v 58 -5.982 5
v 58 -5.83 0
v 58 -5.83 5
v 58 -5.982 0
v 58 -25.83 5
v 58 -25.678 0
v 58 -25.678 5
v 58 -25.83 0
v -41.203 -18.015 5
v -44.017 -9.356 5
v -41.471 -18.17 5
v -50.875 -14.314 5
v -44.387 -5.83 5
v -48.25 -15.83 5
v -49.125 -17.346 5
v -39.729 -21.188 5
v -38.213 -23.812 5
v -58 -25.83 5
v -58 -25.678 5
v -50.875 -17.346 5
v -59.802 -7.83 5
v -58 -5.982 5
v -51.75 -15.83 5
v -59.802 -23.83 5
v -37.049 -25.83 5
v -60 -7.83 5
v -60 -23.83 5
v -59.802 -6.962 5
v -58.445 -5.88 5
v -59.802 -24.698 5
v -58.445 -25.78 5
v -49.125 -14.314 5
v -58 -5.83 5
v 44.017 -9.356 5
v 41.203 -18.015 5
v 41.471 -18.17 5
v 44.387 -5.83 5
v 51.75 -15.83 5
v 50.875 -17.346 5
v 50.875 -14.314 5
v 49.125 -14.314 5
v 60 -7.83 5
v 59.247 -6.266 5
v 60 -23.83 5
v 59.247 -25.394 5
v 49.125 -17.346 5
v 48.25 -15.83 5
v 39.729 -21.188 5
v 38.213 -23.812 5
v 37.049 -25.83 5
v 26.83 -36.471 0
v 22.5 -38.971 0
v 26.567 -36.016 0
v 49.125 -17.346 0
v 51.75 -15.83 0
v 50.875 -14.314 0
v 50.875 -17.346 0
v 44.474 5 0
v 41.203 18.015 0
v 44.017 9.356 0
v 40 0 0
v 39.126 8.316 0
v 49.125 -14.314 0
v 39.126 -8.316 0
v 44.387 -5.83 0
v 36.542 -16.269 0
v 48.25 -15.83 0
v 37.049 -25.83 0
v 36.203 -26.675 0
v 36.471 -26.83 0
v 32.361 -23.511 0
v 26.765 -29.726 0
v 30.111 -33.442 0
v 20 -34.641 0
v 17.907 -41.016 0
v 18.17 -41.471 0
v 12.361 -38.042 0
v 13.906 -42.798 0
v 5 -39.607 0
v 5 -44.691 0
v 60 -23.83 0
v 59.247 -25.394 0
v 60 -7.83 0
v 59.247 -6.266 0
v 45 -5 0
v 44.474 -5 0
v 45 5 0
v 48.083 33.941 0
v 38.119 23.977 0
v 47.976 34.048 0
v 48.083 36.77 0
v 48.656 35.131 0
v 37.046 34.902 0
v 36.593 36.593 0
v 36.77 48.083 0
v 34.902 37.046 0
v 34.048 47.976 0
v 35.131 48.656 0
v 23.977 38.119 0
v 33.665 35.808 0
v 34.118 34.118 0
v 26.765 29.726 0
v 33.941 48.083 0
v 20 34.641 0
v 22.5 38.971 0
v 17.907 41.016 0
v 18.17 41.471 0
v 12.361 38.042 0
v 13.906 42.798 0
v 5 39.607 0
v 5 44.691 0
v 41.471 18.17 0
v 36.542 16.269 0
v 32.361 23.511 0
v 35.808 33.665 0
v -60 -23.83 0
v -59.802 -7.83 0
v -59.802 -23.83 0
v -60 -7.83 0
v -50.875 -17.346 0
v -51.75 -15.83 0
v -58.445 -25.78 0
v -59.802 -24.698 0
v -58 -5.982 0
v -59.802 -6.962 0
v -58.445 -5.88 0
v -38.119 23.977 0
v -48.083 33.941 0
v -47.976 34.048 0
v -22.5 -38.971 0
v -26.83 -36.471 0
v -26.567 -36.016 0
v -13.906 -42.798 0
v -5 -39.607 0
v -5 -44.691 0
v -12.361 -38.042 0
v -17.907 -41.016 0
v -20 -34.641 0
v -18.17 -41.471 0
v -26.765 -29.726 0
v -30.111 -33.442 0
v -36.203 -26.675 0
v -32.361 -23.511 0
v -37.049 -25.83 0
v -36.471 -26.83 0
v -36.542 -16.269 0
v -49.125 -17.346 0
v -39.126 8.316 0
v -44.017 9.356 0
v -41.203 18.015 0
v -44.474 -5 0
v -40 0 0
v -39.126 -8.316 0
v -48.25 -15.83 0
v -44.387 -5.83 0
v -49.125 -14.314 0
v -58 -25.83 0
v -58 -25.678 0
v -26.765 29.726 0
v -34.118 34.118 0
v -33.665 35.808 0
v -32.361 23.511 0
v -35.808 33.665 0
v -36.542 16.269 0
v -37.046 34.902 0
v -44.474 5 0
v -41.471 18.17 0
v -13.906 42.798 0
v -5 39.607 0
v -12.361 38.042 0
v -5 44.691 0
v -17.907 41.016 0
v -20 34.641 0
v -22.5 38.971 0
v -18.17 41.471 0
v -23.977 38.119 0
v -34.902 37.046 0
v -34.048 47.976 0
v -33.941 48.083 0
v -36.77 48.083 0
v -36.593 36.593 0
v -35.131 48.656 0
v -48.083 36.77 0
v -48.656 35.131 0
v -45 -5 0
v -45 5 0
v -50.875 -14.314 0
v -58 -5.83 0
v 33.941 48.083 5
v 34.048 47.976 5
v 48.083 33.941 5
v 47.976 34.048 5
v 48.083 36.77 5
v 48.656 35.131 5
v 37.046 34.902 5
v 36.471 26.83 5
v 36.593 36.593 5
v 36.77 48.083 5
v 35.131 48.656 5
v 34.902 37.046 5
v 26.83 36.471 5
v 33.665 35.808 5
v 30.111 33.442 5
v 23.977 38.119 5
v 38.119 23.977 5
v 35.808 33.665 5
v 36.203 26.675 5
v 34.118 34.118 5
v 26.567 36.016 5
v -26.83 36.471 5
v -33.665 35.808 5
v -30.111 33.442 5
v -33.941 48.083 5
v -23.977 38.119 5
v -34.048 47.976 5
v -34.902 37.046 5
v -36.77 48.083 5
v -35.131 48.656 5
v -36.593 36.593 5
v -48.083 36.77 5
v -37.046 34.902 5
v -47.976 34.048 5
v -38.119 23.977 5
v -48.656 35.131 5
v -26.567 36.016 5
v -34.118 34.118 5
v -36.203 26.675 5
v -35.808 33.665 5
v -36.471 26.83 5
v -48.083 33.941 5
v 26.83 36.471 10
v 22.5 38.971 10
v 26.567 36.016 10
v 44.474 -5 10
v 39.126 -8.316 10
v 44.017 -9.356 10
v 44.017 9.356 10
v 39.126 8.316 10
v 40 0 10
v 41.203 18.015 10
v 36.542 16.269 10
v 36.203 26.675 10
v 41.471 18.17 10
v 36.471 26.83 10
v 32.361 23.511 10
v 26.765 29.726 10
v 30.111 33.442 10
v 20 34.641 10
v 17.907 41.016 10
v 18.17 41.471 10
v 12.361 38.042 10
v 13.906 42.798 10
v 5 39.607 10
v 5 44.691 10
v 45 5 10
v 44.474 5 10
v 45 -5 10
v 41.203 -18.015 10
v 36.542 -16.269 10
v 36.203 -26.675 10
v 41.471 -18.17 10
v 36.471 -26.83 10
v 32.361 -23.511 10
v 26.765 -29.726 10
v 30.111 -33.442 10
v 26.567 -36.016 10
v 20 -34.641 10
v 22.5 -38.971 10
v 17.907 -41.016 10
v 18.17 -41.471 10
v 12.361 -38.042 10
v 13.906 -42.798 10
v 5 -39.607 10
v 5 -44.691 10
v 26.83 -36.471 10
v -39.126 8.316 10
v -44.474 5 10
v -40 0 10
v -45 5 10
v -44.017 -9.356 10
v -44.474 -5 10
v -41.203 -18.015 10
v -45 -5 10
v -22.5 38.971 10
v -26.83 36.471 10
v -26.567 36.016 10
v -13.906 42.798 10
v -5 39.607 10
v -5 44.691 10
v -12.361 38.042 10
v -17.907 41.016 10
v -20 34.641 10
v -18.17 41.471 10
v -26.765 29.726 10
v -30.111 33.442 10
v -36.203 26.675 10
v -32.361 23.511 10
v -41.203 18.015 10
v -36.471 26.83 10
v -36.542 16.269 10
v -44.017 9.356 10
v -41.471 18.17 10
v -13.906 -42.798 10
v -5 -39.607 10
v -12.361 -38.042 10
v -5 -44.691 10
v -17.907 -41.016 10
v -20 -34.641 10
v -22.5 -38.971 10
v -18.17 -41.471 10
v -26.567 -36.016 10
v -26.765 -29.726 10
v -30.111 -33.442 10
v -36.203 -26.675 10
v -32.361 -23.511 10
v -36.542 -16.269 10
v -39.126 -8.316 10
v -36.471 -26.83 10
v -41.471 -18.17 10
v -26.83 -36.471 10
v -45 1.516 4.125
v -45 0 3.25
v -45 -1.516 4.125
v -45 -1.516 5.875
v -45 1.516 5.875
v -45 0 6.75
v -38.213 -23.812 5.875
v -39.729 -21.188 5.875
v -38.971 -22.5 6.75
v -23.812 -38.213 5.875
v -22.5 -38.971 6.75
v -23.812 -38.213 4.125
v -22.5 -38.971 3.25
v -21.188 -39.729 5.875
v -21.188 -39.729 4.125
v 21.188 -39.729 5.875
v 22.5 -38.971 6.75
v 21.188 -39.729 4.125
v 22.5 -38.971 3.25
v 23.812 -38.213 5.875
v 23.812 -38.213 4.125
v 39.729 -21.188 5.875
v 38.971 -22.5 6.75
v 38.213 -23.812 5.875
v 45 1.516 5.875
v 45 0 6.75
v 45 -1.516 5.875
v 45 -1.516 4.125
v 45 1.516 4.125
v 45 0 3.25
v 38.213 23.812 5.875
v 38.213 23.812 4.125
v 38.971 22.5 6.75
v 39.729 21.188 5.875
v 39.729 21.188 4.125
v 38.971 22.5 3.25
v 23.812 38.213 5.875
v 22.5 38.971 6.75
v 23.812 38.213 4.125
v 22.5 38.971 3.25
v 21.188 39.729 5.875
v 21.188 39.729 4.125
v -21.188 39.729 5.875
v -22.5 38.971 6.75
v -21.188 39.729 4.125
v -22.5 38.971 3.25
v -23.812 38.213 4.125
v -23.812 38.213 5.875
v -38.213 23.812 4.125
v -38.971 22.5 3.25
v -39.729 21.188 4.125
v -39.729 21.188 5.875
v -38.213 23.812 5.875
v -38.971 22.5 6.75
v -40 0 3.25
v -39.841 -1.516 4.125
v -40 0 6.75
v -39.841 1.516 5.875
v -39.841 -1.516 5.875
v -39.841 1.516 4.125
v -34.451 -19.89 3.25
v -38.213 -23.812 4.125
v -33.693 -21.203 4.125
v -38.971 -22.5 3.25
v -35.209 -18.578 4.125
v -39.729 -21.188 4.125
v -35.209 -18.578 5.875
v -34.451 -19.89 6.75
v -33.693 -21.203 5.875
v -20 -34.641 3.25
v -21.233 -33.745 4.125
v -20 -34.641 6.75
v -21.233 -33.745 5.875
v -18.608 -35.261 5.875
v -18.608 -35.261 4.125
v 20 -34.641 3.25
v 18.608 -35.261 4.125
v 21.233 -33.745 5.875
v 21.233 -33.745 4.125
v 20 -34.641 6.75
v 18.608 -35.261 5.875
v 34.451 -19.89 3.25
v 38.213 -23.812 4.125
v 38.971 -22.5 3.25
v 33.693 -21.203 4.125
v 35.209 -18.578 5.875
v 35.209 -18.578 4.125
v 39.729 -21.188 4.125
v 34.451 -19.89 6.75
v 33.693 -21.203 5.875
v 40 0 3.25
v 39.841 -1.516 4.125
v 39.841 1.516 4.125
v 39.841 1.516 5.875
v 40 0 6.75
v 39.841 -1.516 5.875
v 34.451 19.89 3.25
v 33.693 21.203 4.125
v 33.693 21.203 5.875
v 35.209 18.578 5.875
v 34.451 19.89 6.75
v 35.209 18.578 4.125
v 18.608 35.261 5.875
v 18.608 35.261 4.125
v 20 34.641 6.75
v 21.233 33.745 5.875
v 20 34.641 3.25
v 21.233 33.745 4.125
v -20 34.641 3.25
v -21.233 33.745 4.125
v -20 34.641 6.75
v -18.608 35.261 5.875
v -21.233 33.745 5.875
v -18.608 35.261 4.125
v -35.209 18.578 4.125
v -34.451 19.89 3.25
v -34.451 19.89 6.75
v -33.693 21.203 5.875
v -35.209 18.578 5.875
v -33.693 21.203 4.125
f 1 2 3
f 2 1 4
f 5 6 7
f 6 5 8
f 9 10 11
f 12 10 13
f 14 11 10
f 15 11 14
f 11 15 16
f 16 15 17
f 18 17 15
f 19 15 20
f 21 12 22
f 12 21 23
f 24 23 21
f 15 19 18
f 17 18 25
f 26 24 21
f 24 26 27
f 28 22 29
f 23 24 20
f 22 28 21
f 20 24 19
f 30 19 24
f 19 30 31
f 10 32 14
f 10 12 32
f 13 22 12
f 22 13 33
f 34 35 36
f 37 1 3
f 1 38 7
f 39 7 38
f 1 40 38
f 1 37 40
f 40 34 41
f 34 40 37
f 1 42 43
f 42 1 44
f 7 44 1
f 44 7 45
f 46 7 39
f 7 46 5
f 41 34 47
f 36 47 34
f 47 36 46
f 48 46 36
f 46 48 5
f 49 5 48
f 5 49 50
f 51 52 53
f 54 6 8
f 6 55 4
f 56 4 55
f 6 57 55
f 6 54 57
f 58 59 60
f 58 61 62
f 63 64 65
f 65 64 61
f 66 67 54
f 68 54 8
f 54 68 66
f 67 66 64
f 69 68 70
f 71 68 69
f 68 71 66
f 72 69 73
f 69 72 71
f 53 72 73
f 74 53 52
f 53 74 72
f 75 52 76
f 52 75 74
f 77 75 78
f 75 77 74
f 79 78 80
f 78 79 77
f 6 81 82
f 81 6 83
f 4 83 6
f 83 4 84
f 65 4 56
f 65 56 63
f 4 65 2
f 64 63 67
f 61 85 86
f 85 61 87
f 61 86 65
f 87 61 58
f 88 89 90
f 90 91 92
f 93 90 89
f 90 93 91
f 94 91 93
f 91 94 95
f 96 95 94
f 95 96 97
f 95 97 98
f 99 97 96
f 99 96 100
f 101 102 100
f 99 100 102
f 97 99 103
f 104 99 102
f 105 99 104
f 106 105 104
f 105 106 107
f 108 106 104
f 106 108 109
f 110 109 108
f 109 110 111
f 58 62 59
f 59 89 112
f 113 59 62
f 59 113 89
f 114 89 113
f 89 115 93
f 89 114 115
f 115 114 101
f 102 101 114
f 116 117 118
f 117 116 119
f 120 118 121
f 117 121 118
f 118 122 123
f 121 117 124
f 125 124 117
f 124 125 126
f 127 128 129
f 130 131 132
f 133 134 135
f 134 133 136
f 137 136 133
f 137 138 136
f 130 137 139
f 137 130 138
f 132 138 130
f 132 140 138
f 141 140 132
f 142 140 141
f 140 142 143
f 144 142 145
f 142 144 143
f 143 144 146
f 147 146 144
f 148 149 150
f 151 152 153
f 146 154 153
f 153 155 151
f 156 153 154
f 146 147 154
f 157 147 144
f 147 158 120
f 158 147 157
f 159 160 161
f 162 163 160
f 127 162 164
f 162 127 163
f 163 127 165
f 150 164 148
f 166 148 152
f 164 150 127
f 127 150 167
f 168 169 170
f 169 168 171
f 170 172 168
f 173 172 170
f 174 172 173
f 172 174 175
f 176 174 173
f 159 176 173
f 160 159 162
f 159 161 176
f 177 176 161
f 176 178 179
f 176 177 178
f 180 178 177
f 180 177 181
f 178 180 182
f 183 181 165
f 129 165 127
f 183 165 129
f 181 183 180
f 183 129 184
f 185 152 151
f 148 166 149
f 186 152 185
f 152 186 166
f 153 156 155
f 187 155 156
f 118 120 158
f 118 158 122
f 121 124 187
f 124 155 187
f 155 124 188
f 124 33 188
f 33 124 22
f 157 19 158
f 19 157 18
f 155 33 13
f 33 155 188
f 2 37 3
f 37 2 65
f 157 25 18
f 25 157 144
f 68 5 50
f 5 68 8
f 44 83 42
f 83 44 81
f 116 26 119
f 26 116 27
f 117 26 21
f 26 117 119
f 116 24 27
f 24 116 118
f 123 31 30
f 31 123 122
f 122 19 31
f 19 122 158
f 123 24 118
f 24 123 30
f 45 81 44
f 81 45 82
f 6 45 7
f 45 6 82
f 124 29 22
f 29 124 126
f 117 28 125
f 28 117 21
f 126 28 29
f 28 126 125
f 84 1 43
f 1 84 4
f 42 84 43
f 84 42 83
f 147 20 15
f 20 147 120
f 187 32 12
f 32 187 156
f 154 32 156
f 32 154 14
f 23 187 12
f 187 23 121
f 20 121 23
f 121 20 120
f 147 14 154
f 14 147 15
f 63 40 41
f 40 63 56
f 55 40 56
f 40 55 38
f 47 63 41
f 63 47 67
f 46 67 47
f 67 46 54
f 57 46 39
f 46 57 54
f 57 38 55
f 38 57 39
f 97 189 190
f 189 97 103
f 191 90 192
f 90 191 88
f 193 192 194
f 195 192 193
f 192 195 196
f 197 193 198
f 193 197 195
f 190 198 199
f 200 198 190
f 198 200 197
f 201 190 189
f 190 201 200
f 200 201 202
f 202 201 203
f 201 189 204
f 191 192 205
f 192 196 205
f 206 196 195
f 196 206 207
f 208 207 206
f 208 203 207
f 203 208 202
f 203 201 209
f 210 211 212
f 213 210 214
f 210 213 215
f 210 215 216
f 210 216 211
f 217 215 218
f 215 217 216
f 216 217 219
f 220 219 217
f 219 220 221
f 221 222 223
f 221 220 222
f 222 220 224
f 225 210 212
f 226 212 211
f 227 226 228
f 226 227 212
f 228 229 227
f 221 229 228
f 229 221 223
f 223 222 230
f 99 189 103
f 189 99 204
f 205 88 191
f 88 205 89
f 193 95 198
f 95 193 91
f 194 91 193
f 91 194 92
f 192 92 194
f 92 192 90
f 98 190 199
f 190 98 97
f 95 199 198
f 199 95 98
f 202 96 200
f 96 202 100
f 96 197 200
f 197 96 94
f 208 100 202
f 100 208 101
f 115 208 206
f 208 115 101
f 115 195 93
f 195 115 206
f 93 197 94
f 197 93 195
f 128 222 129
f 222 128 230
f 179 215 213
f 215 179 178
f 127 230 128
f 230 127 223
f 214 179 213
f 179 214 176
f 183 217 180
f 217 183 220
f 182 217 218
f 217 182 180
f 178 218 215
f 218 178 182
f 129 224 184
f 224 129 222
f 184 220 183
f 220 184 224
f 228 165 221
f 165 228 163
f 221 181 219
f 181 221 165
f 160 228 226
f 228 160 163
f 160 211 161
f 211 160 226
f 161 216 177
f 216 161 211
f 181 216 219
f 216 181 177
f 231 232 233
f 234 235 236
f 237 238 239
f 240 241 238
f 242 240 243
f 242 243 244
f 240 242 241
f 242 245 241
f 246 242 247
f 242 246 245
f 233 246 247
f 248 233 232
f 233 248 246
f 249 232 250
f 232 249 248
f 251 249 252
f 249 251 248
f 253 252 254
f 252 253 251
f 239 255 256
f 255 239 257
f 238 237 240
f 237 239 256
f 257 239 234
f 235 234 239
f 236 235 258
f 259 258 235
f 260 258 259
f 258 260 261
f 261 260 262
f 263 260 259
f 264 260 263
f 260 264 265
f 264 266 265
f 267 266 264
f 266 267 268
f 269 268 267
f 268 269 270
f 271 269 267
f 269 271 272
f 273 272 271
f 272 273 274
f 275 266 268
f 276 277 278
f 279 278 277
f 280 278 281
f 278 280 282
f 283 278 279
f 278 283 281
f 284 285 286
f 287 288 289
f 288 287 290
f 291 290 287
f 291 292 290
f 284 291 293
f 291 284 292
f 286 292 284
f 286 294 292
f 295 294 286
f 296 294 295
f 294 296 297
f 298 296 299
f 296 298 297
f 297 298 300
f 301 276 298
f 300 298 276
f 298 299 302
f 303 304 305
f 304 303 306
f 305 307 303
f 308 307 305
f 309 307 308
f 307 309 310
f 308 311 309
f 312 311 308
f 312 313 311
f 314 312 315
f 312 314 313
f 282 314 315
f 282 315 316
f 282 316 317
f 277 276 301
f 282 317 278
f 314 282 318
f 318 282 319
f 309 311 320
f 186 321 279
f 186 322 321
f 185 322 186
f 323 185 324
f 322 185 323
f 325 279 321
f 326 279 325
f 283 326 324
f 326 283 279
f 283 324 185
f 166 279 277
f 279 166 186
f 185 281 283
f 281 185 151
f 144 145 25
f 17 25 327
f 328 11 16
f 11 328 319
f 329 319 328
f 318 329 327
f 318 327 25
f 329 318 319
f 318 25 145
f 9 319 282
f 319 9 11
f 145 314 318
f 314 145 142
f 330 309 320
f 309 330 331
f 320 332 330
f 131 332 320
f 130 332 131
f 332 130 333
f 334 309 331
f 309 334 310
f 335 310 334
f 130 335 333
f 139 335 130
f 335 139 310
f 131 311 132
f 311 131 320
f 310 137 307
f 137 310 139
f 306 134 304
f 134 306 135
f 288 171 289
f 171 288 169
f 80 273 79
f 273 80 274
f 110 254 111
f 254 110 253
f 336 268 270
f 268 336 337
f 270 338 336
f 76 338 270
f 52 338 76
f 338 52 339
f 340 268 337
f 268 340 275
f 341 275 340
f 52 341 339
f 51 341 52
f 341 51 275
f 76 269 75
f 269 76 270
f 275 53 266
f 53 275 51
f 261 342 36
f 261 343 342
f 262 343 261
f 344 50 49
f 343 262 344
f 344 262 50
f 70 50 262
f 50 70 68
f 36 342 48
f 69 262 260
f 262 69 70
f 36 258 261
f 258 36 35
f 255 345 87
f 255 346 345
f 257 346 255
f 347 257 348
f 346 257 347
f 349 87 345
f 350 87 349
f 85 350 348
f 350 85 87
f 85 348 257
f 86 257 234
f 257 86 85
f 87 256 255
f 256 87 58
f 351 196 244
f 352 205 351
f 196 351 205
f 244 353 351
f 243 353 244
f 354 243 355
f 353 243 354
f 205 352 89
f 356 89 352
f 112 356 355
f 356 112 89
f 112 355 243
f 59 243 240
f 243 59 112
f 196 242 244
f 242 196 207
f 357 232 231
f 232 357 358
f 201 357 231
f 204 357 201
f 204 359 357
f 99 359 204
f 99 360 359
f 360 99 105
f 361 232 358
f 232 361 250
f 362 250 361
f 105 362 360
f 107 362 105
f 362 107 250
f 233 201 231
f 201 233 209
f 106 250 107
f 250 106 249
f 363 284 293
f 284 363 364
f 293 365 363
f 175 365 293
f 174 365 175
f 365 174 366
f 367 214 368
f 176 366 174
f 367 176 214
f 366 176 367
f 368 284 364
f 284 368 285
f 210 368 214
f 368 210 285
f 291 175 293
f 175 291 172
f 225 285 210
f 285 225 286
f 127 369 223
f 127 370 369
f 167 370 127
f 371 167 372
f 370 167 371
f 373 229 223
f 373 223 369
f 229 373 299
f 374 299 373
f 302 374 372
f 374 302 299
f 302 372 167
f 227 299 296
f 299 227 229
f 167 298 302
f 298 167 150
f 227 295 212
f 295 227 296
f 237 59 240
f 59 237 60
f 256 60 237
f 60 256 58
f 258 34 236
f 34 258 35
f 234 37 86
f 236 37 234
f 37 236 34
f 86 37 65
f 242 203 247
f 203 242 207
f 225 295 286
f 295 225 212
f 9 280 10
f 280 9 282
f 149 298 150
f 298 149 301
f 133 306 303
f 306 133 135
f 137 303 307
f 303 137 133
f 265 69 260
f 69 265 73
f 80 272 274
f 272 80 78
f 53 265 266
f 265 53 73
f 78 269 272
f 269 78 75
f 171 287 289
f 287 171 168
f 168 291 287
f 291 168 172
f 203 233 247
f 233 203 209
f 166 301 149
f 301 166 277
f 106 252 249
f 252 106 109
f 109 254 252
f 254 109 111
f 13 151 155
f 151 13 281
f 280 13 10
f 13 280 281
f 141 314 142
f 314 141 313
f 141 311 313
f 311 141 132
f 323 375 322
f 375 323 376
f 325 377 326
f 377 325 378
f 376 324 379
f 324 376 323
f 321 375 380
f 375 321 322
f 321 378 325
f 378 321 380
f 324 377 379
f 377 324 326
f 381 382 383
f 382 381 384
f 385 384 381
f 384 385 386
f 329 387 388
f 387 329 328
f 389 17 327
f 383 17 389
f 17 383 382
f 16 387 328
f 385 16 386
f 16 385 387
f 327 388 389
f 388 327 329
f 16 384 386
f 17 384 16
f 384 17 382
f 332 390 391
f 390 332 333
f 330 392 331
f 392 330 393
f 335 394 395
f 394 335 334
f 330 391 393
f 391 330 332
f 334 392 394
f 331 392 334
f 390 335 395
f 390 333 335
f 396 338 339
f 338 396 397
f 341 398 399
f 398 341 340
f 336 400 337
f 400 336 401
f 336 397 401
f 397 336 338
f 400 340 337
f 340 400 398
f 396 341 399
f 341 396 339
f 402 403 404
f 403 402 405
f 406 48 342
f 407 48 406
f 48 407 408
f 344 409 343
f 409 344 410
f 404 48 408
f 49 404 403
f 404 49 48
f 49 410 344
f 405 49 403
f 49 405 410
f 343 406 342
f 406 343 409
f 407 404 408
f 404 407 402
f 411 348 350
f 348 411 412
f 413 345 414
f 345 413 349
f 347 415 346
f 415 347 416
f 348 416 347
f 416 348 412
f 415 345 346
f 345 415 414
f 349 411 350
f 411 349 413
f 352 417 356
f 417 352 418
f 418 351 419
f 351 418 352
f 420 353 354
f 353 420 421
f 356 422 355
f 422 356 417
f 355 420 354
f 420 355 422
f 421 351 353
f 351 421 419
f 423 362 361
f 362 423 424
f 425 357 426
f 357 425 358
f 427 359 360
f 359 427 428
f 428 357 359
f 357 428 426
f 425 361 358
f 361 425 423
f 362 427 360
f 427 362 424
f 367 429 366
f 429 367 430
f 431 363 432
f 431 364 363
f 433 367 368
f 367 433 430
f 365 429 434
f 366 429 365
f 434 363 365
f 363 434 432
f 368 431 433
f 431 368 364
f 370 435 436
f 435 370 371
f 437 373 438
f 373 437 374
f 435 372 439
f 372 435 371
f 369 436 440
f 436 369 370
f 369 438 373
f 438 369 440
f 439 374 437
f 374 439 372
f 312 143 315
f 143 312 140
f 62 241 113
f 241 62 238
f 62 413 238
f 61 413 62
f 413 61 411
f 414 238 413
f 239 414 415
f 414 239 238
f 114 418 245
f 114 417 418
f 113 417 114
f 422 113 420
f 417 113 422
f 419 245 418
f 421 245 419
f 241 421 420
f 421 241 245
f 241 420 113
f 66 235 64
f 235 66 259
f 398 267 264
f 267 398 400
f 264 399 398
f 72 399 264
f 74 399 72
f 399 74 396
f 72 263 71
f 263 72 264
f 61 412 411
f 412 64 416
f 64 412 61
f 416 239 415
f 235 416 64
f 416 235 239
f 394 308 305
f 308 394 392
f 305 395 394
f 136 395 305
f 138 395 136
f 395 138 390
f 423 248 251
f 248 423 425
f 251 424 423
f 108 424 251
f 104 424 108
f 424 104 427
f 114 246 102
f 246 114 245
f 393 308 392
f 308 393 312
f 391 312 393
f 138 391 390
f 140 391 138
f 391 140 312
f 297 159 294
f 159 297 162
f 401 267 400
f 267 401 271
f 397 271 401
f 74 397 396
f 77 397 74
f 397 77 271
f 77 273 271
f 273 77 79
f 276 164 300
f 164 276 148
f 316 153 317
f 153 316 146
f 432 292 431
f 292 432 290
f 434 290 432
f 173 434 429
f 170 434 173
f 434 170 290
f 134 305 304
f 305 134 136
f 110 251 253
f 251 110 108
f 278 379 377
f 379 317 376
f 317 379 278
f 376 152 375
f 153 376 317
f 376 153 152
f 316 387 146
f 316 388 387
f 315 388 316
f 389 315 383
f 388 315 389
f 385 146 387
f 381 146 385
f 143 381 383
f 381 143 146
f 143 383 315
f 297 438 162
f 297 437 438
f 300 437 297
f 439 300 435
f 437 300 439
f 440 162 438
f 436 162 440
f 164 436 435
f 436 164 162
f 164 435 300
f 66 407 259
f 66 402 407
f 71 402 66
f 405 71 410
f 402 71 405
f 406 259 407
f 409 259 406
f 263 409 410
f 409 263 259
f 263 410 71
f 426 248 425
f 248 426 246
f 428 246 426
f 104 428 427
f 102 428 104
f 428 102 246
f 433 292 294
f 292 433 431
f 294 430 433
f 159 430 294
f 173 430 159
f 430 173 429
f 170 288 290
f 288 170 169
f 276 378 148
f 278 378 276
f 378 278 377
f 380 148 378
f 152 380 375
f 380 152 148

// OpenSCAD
//Copyright (c) 2011, Nirav Patel <http://eclecti.cc>
//Code for mount was modified from original provided by Nirav Patel
//to suit the globe, lens and projector used on project
// original code can be found here https://github.com/nrpatel/SnowGlobe/tree/master/hardware

opteka_r1 = 37.6/2; //groove on top of lens mount
opteka_r2 = 41.66/2; //depth of lens mount= diameter of lens top

module rounded(size, r) {
    union() {
        translate([r, 0, 0]) cube([size[0]-2*r, size[1], size[2]]);
        translate([0, r, 0]) cube([size[0], size[1]-2*r, size[2]]);
        translate([r, r, 0]) cylinder(h=size[2], r=r);
        translate([size[0]-r, r, 0]) cylinder(h=size[2], r=r);
        translate([r, size[1]-r, 0]) cylinder(h=size[2], r=r);
        translate([size[0]-r, size[1]-r, 0]) cylinder(h=size[2], r=r);
    }
}

module opteka() {
    union() {
        cylinder(r=29.14/2, h=7);//inside diameter small part of bottom of lens
        translate([0, 0, 3]) cylinder(r=opteka_r1, h=2.5);
        cylinder(r=25.26/2, h=10); //hole size of lens mount
        translate([0, 0, 10]) cylinder(r1=25/2, r2=opteka_r2, h=3);
        translate([0, 0, 13]) cylinder(r=opteka_r2, h=8.42);
    }
}

margin = 0.1;
angle = -7; //projector angle to center projection image through fish-eye lens
wall = 5; // globe mount thickness
wall2 = 3; //projector bracket thickness
image_h = 10; 

//projector dimensions
sony_offset = 22; //offset of projector lens
sony_w = 77; //projector width, bracket distance
sony_wb = 69.75; //outside edge of projector bracket
sony_wb2 = 49.75; //inside edge of projector bracket
sony_l1 = 170; //length 1
sony_l2 = 100; //length 2

globe_r1 = 80/2; //globe opening radius
globe_r2 = 80/2; // bottom of globe radius for mount
globe_h = 10; //size of globe mount holes
globe_bolt = 3.5/2;

module lens_mount() difference() {
    translate([0, 0, -2]) union() {
        translate([0, 0, opteka_r2]) rotate([angle, 0, 0]) difference() {
            union() {
                difference() {
                   //position of globe mount base
                    translate([-globe_r2-4*wall, -12, -opteka_r2-wall]) cube([2*(globe_r2+4*wall), 2*wall, 4*wall]);
                    translate([-globe_r2-2*wall, -12, -opteka_r2+wall]) rotate([-90, 0, 0]) cylinder(r=globe_bolt, h=20);
                    translate([globe_r2+2*wall, -12, -opteka_r2+wall]) rotate([-90, 0, 0]) cylinder(r=globe_bolt, h=20);
                }
                //globe mount angles
                for(t = [-45, -135]) {
                    rotate([0, t, 0]) translate([0, -12, -2*wall]) difference() {
                        cube([globe_r2+4*wall, 2*wall, 4*wall]);
                        translate([globe_r2+2*wall, 0, 2*wall]) rotate([-90, 0, 0]) cylinder(r=globe_bolt, h=globe_h);
                    }
                }
                translate([-opteka_r1-wall, -12, -opteka_r2-wall]) union() {
                    cube([2*(opteka_r1+wall), 12, (opteka_r2+wall+opteka_r1)]);
                    rounded([2*(opteka_r1+wall), 2*(opteka_r1+wall), 17], 10);
                }
            }
            minkowski() {
                rotate([90, 0, 0]) opteka();
                translate([-margin, -margin, -margin]) cube([margin*2, margin*2, 50+margin]);
            }
        }
        
        
        translate([-sony_offset, 0, 0]) difference() {
            union() {
                translate([-sony_wb/2, 0, 0]) rounded([sony_wb, sony_l1, opteka_r2-image_h], 10);
                translate([-sony_wb2/2, 0, 0]) rounded([sony_wb2, sony_l2, opteka_r2-image_h], 20);
                
                //bracket points for projector
                for(y = [10, 80]) {
                    union() {
                        translate([-sony_w/2-wall2, y, 0]) cube([wall2, 10, 20]);
                        translate([sony_w/2, y, 0]) cube([wall2, 10, 20]);
                        translate([-sony_w/2, y, 0]) cube([sony_w, 10, opteka_r2-image_h]);
                    }
                }
            }
            translate([-sony_wb2/2+wall, wall, 0]) rounded([sony_wb2-2*wall, sony_l2-2*wall, 50], 10);
        }
    }
    
    translate([-200, -200, -100]) cube([400, 400, 100]);
}

module globe_mount() {
    difference() {
        union() {
            cylinder(r1=globe_r2+wall, r2=globe_r1+wall, h=globe_h);
            translate([-globe_r2-4*wall, -opteka_r2-wall, 0]) difference() {
                rounded([2*(globe_r2+4*wall), 4*wall, wall],2);
                translate([2*wall, 2*wall, 0]) cylinder(r=globe_bolt, h=globe_h);
                translate([2*globe_r2+6*wall, 2*wall, 0]) cylinder(r=globe_bolt, h=globe_h);
            }
            for(t = [45, 135]) {
                rotate([0, 0, t]) translate([0, -2*wall, 0]) difference() {
                    rounded([globe_r2+4*wall, 4*wall, wall], 2);
                    translate([globe_r2+2*wall, 2*wall, 0]) cylinder(r=globe_bolt, h=globe_h);
                }
            }
            for(i = [0:11]) {
                rotate([0, 0, i*360/12]) translate([-globe_r2-wall, -wall, 0]) cube([20, 2*wall, globe_h/2+wall]);
            }
        }
        cylinder(r1=globe_r2, r2=globe_r1, h=globe_h-wall);
        cylinder(r=globe_r1, h=globe_h+1);
        translate([-wall, -globe_r2-2*wall, 0]) cube([2*wall, 2*(globe_r2+2*wall), globe_h+1]);
        for(i = [0:11]) {
            rotate([0, 0, i*360/12]) translate([-globe_r2-wall, 0, globe_h/2]) rotate([0, 90, 0]) cylinder(r=globe_bolt, h=20);
        }
    }
}

//lens_mount();

globe_mount();
